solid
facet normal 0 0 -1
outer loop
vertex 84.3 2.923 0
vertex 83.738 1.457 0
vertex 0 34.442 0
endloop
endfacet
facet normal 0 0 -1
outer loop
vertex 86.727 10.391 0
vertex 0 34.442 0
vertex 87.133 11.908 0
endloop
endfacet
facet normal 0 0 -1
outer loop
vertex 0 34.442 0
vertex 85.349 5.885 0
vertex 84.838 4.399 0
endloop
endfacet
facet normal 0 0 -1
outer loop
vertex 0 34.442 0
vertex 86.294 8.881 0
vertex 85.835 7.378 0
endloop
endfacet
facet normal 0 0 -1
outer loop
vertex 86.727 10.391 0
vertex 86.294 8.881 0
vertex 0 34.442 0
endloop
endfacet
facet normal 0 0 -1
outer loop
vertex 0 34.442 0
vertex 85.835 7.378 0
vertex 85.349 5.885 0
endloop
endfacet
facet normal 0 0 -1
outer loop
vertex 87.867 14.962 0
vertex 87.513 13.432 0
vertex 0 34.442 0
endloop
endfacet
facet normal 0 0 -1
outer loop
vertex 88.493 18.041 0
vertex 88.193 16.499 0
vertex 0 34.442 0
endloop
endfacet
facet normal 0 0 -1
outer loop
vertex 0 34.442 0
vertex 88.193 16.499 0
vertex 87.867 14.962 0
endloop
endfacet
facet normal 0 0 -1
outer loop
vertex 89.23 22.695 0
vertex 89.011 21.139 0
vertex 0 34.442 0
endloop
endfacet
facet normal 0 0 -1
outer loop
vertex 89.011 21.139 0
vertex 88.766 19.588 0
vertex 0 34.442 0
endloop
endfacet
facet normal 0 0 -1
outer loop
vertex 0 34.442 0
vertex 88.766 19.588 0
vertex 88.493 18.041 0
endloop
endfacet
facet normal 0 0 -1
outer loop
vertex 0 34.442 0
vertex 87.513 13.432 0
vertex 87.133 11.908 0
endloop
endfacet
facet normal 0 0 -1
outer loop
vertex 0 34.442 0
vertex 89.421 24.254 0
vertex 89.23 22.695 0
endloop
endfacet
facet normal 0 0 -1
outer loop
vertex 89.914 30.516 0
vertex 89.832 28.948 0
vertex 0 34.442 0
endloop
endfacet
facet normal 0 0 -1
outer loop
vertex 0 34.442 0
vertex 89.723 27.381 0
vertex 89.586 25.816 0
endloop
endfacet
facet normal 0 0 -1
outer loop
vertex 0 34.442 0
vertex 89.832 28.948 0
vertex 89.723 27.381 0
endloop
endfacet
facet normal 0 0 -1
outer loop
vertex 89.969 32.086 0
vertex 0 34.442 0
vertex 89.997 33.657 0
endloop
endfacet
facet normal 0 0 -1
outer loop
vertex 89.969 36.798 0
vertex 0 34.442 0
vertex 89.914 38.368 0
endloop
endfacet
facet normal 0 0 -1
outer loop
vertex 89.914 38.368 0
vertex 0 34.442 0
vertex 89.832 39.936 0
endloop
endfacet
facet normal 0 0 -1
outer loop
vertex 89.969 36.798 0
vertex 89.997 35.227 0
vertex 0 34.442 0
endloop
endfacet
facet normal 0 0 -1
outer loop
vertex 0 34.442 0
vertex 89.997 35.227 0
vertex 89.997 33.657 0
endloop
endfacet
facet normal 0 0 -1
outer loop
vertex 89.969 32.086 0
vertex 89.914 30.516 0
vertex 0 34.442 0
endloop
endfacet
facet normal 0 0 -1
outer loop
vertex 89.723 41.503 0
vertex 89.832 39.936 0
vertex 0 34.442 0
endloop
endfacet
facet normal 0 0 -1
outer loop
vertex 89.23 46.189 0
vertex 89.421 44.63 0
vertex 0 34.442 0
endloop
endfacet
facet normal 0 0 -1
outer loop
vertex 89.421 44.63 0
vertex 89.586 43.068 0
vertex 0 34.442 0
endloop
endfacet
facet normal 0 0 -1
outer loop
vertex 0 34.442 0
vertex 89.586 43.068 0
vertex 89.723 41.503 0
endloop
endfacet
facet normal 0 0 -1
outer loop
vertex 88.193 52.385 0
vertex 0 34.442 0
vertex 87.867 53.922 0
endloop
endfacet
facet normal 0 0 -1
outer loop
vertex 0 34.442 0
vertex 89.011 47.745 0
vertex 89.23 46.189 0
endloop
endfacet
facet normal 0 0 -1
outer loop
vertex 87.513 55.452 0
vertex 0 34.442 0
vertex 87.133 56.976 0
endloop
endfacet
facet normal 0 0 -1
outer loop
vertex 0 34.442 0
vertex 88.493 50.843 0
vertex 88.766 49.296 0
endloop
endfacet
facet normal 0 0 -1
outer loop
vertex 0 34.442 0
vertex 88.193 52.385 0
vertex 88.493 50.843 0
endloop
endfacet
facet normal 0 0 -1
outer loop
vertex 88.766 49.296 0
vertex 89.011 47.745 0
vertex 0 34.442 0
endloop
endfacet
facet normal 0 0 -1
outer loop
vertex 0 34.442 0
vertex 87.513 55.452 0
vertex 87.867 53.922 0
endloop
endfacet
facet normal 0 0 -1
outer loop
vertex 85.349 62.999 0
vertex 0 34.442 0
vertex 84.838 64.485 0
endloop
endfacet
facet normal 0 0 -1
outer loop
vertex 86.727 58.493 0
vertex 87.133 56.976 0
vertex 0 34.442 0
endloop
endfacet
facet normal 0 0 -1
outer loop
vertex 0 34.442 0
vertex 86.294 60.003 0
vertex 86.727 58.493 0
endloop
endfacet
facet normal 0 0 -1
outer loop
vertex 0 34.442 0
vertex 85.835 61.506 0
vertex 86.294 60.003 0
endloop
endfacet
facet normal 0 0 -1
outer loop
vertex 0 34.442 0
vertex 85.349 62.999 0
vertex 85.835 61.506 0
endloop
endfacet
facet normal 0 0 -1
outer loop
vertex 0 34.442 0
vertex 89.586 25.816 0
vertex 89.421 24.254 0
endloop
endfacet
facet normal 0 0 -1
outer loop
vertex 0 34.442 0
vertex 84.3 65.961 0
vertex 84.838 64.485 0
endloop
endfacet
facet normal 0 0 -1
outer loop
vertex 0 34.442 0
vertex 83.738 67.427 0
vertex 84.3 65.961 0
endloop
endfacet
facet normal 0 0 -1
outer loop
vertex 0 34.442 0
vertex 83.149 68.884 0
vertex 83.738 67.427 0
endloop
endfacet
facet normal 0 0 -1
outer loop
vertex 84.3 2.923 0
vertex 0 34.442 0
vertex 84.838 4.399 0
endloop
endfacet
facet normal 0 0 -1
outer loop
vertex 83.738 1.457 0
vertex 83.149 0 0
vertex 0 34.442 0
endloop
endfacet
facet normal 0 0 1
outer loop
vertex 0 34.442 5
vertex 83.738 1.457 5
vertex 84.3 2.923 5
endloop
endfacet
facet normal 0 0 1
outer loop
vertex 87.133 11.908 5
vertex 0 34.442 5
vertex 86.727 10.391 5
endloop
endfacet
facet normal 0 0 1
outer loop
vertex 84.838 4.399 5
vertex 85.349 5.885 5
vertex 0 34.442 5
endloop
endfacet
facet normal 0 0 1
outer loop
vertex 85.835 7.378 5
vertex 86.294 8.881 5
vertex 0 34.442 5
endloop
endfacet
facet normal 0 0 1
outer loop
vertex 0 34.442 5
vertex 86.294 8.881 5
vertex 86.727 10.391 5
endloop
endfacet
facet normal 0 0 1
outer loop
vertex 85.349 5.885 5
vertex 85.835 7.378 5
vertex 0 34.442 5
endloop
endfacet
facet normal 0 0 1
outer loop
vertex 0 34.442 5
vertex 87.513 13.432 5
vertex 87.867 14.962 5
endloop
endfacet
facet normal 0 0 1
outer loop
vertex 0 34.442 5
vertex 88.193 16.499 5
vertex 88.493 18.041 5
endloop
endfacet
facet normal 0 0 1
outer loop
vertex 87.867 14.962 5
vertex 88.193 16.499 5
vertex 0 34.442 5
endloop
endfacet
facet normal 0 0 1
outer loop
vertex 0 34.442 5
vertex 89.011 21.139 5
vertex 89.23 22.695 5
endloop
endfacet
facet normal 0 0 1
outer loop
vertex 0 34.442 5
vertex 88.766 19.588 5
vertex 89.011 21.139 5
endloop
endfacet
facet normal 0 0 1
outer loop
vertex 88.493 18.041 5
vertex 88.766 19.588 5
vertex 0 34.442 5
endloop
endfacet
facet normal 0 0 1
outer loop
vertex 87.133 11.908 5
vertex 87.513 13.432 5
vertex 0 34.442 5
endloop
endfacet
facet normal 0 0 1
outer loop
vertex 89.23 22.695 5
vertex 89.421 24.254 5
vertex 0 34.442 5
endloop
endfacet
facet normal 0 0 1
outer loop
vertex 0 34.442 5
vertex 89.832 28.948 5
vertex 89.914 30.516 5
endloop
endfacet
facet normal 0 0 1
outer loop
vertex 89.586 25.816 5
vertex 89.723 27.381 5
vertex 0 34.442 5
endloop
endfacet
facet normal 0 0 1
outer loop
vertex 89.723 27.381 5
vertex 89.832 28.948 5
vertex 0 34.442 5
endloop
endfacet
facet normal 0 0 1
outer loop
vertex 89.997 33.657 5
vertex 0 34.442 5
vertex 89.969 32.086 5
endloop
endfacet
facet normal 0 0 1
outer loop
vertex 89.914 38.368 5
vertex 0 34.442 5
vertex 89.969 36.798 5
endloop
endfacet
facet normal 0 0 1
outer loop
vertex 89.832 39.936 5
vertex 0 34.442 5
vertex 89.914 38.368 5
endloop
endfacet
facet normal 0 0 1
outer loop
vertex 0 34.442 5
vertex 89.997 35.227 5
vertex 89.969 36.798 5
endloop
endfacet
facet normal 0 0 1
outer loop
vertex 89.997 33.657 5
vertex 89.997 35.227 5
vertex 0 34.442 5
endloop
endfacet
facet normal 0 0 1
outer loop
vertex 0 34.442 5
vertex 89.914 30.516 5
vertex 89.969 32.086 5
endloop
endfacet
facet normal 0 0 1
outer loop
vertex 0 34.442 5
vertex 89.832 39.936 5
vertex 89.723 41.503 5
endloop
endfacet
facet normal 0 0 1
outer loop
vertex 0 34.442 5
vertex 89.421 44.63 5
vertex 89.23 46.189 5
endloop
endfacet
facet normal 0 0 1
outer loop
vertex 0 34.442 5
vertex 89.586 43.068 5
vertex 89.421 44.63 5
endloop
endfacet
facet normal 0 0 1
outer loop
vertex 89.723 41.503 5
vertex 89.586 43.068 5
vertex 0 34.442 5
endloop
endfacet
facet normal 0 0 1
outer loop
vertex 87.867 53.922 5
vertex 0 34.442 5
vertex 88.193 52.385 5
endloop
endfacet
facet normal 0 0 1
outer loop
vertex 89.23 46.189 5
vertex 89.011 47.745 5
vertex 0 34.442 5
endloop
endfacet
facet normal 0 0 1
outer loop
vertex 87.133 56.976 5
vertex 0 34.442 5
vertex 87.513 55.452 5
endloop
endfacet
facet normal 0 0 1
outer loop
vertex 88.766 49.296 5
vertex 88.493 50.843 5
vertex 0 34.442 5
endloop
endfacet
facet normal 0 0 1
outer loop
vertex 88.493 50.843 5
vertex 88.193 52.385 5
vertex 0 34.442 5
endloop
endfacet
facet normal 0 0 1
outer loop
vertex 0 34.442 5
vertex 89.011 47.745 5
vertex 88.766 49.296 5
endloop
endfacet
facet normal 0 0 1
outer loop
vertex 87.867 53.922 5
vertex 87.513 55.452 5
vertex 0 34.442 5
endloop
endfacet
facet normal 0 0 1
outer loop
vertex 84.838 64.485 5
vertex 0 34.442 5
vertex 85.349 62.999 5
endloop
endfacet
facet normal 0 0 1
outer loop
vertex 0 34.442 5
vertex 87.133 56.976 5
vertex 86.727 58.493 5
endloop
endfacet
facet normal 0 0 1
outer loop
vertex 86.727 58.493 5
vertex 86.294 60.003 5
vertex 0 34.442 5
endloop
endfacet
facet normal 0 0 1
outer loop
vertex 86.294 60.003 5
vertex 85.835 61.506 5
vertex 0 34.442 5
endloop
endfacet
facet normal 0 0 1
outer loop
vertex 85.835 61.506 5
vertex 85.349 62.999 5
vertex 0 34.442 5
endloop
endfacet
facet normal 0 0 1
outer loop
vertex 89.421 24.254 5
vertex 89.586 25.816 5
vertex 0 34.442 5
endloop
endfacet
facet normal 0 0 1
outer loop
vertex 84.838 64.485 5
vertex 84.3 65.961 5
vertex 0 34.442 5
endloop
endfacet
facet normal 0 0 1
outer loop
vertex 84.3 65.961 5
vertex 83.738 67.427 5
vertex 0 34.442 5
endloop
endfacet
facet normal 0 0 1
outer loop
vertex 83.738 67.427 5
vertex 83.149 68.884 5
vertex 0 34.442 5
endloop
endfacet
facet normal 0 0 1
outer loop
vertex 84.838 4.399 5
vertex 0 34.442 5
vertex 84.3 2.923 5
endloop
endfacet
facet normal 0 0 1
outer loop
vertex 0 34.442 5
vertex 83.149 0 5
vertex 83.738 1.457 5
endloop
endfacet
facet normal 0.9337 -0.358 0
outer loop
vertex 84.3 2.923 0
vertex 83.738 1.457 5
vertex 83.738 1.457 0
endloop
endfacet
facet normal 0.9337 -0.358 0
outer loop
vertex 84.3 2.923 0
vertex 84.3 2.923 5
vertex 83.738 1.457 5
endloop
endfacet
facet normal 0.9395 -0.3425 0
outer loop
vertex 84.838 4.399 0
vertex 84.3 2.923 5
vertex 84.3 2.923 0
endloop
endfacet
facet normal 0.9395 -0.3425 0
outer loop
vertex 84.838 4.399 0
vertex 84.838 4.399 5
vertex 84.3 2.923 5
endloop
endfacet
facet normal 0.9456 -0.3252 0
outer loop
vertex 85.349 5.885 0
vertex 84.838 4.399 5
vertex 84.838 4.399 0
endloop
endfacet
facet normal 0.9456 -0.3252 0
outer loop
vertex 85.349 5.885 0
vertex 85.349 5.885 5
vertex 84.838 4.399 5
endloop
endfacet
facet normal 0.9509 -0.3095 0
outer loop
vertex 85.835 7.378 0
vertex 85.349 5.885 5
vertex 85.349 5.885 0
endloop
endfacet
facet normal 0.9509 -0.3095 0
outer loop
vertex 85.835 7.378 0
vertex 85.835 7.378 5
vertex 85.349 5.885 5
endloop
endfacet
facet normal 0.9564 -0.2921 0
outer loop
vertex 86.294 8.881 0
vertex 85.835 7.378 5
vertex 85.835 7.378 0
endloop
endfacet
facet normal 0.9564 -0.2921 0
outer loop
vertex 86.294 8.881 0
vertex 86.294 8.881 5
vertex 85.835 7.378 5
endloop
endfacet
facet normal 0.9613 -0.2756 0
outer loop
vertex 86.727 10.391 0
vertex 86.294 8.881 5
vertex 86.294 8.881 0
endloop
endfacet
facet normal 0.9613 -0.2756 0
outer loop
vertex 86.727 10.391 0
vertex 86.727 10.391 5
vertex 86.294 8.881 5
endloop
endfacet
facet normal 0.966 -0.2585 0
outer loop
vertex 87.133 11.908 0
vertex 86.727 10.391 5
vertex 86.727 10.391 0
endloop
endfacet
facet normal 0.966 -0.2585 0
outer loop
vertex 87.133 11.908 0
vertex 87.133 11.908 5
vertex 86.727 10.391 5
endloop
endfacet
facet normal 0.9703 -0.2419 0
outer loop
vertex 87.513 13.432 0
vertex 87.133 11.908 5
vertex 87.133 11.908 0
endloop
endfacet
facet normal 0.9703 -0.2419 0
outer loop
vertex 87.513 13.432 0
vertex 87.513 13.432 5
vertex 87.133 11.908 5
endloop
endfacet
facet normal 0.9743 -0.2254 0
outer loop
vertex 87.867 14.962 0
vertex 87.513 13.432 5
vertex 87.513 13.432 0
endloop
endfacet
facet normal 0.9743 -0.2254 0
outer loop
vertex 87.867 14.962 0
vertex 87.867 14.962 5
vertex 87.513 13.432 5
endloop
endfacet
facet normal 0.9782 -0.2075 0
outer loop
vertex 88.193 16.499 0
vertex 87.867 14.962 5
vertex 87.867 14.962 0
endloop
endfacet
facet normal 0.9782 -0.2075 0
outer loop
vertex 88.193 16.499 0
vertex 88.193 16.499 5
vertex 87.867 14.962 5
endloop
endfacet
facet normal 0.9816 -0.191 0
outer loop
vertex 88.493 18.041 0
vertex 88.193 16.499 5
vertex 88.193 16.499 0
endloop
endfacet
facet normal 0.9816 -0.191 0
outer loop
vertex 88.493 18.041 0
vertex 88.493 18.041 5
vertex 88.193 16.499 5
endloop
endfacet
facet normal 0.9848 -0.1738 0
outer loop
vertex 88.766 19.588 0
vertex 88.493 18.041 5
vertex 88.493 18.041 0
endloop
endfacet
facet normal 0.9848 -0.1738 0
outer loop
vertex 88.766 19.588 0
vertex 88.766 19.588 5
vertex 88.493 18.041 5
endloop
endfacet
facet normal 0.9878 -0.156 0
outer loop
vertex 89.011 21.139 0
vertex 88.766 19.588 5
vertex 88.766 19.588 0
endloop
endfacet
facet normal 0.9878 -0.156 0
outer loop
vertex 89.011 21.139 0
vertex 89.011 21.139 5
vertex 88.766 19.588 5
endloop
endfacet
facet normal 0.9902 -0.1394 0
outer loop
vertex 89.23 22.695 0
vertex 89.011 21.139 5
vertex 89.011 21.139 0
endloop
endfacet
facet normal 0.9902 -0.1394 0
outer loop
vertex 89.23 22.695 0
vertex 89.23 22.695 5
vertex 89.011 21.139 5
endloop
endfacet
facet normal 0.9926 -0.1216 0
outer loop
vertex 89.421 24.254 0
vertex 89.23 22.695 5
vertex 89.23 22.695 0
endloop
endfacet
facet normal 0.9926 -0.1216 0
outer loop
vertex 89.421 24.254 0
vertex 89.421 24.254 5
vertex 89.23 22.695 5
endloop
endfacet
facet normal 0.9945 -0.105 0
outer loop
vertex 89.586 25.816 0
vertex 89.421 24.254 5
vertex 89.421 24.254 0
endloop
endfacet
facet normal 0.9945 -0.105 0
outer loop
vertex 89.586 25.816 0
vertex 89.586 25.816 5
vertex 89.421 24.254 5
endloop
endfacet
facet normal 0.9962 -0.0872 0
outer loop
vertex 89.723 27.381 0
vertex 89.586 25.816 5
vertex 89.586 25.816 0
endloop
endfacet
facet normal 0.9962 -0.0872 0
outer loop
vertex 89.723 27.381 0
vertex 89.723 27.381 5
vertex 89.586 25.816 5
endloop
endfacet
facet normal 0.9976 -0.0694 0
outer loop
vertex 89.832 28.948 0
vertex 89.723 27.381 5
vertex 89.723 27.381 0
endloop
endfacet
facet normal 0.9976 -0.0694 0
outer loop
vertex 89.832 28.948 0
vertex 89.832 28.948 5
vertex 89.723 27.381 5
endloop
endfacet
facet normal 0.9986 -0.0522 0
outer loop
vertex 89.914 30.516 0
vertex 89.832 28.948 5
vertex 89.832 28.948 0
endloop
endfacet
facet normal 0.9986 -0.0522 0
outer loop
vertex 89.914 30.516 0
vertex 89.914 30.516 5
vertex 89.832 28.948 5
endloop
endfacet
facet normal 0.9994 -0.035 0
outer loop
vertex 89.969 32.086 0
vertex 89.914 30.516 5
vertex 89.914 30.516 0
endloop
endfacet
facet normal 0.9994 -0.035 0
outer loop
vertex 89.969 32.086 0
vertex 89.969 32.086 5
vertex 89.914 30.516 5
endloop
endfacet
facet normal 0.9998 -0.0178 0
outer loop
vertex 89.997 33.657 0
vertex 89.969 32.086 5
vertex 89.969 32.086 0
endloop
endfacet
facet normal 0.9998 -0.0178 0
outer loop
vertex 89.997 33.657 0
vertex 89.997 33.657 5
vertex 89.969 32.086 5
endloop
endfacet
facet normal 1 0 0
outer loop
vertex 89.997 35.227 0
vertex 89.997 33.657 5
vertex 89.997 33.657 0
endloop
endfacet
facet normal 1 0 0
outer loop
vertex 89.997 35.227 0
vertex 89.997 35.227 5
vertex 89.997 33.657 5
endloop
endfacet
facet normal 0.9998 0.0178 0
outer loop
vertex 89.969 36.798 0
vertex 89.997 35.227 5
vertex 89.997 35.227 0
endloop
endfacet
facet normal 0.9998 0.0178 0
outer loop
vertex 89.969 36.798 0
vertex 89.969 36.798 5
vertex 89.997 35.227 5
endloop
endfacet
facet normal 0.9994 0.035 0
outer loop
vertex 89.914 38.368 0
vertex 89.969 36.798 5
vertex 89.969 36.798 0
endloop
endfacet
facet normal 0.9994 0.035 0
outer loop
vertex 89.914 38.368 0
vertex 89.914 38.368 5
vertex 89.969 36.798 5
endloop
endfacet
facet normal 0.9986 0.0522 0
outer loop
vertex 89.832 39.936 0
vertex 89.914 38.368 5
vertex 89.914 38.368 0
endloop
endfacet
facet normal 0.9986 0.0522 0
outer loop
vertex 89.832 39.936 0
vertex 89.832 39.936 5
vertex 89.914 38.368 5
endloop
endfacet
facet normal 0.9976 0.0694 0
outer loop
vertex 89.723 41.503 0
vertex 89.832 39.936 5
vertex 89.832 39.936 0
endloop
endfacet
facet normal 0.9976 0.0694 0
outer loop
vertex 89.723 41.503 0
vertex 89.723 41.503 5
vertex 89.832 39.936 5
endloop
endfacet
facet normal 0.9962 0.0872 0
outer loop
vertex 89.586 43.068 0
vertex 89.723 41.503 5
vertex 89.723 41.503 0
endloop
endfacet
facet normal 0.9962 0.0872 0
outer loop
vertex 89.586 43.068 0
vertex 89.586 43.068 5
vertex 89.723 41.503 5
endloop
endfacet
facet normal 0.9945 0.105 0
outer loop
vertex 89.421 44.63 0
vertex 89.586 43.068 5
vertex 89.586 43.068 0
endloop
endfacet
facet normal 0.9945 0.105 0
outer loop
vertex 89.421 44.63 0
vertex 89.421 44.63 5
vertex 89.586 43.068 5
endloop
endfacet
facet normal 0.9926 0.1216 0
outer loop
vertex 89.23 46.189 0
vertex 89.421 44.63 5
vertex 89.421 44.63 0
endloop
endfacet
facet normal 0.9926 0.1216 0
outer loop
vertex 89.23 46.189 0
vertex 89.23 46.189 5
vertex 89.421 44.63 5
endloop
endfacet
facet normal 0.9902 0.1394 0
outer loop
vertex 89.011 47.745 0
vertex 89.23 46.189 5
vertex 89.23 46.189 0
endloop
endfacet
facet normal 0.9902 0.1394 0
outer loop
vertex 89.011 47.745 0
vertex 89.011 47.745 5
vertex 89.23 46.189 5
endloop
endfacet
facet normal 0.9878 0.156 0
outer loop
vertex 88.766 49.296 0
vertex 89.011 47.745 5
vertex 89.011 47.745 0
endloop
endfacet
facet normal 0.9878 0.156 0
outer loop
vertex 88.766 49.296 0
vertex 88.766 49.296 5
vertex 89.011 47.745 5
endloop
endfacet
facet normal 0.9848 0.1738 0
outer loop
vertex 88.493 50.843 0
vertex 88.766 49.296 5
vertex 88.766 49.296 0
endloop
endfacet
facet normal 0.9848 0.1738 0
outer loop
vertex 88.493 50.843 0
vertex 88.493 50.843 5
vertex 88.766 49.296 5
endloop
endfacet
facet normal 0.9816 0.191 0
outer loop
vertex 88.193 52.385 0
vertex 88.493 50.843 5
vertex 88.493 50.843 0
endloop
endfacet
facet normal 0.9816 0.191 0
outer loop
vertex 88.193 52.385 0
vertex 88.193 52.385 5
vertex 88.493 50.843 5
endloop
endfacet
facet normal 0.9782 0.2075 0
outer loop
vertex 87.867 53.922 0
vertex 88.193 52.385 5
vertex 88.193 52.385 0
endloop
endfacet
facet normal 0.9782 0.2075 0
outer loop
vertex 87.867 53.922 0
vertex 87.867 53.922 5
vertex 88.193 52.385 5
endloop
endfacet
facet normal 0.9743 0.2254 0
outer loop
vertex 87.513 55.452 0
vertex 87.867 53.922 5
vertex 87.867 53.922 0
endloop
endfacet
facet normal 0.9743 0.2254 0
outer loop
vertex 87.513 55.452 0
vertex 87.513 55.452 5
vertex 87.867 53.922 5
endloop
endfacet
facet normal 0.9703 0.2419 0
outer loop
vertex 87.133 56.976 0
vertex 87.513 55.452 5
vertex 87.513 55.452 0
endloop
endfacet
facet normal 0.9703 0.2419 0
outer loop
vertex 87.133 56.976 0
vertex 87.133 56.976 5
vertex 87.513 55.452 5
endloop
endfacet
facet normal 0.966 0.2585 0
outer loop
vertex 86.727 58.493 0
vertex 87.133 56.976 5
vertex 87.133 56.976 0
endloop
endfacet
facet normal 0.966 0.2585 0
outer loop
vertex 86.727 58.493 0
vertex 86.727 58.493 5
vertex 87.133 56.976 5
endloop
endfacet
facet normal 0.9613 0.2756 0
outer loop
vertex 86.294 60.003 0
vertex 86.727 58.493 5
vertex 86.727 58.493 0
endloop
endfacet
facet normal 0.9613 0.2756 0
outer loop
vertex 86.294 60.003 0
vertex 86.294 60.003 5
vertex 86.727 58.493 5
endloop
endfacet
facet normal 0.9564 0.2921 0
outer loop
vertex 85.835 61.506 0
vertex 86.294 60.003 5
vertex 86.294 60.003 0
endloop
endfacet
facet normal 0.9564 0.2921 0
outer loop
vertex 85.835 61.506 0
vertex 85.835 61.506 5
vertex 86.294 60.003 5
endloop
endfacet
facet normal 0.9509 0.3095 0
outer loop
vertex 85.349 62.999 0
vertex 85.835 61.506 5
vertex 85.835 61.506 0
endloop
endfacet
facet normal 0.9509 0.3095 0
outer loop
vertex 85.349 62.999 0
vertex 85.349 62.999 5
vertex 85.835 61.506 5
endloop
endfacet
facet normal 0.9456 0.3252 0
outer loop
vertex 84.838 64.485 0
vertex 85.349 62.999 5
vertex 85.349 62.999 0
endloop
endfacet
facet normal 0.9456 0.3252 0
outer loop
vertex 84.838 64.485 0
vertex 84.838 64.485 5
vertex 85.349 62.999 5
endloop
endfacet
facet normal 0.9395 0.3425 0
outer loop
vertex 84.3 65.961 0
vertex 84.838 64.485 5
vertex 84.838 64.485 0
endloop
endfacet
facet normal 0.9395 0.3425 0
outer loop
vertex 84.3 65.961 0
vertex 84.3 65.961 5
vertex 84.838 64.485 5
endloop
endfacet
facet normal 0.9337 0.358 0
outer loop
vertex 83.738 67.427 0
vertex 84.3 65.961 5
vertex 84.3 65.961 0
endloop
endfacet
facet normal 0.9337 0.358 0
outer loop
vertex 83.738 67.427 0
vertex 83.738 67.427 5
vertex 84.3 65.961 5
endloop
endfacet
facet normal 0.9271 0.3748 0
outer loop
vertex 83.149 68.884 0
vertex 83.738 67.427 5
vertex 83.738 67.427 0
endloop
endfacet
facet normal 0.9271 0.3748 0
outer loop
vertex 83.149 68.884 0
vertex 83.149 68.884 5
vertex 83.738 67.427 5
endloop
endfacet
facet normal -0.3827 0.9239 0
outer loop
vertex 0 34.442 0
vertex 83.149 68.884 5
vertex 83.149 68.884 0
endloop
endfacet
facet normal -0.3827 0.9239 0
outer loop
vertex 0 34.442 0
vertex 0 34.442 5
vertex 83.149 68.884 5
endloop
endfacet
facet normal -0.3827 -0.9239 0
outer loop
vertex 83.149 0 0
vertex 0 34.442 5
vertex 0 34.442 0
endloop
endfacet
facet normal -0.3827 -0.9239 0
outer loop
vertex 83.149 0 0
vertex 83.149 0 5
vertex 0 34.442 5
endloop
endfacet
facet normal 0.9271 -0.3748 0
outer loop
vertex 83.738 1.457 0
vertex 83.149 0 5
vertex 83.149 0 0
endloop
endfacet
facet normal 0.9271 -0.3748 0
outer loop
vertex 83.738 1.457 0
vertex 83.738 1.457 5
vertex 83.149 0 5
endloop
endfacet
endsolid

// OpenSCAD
$fn = 32;

// ----------------------------------------------------------------------
// Arc profile plate: sector, 47 points
// ----------------------------------------------------------------------

// --- parameters (mm) ---
sector_angle = 45;        // sector angle, degrees
sector_r = 90;            // outer radius
arc_step = 1;             // sampling step of the arc, degrees
plate_t = 5;              // plate thickness, Z

bbox_x = 2 * sector_r * sin(sector_angle / 2);  // chord of the sector
bbox_y = sector_r;  // depth of the sector (apex to arc)

profile = [[83.149, 0], [83.738, 1.457], [84.3, 2.923], [84.838, 4.399], [85.349, 5.885], [85.835, 7.378], [86.294, 8.881], [86.727, 10.391], [87.133, 11.908], [87.513, 13.432], [87.867, 14.962], [88.193, 16.499], [88.493, 18.041], [88.766, 19.588], [89.011, 21.139], [89.23, 22.695], [89.421, 24.254], [89.586, 25.816], [89.723, 27.381], [89.832, 28.948], [89.914, 30.516], [89.969, 32.086], [89.997, 33.657], [89.997, 35.227], [89.969, 36.798], [89.914, 38.368], [89.832, 39.936], [89.723, 41.503], [89.586, 43.068], [89.421, 44.63], [89.23, 46.189], [89.011, 47.745], [88.766, 49.296], [88.493, 50.843], [88.193, 52.385], [87.867, 53.922], [87.513, 55.452], [87.133, 56.976], [86.727, 58.493], [86.294, 60.003], [85.835, 61.506], [85.349, 62.999], [84.838, 64.485], [84.3, 65.961], [83.738, 67.427], [83.149, 68.884], [0, 34.442]];  // primary outline, 47 points, counter clockwise

// --- the one profile operation ---
linear_extrude(height = plate_t) polygon(points = profile);
